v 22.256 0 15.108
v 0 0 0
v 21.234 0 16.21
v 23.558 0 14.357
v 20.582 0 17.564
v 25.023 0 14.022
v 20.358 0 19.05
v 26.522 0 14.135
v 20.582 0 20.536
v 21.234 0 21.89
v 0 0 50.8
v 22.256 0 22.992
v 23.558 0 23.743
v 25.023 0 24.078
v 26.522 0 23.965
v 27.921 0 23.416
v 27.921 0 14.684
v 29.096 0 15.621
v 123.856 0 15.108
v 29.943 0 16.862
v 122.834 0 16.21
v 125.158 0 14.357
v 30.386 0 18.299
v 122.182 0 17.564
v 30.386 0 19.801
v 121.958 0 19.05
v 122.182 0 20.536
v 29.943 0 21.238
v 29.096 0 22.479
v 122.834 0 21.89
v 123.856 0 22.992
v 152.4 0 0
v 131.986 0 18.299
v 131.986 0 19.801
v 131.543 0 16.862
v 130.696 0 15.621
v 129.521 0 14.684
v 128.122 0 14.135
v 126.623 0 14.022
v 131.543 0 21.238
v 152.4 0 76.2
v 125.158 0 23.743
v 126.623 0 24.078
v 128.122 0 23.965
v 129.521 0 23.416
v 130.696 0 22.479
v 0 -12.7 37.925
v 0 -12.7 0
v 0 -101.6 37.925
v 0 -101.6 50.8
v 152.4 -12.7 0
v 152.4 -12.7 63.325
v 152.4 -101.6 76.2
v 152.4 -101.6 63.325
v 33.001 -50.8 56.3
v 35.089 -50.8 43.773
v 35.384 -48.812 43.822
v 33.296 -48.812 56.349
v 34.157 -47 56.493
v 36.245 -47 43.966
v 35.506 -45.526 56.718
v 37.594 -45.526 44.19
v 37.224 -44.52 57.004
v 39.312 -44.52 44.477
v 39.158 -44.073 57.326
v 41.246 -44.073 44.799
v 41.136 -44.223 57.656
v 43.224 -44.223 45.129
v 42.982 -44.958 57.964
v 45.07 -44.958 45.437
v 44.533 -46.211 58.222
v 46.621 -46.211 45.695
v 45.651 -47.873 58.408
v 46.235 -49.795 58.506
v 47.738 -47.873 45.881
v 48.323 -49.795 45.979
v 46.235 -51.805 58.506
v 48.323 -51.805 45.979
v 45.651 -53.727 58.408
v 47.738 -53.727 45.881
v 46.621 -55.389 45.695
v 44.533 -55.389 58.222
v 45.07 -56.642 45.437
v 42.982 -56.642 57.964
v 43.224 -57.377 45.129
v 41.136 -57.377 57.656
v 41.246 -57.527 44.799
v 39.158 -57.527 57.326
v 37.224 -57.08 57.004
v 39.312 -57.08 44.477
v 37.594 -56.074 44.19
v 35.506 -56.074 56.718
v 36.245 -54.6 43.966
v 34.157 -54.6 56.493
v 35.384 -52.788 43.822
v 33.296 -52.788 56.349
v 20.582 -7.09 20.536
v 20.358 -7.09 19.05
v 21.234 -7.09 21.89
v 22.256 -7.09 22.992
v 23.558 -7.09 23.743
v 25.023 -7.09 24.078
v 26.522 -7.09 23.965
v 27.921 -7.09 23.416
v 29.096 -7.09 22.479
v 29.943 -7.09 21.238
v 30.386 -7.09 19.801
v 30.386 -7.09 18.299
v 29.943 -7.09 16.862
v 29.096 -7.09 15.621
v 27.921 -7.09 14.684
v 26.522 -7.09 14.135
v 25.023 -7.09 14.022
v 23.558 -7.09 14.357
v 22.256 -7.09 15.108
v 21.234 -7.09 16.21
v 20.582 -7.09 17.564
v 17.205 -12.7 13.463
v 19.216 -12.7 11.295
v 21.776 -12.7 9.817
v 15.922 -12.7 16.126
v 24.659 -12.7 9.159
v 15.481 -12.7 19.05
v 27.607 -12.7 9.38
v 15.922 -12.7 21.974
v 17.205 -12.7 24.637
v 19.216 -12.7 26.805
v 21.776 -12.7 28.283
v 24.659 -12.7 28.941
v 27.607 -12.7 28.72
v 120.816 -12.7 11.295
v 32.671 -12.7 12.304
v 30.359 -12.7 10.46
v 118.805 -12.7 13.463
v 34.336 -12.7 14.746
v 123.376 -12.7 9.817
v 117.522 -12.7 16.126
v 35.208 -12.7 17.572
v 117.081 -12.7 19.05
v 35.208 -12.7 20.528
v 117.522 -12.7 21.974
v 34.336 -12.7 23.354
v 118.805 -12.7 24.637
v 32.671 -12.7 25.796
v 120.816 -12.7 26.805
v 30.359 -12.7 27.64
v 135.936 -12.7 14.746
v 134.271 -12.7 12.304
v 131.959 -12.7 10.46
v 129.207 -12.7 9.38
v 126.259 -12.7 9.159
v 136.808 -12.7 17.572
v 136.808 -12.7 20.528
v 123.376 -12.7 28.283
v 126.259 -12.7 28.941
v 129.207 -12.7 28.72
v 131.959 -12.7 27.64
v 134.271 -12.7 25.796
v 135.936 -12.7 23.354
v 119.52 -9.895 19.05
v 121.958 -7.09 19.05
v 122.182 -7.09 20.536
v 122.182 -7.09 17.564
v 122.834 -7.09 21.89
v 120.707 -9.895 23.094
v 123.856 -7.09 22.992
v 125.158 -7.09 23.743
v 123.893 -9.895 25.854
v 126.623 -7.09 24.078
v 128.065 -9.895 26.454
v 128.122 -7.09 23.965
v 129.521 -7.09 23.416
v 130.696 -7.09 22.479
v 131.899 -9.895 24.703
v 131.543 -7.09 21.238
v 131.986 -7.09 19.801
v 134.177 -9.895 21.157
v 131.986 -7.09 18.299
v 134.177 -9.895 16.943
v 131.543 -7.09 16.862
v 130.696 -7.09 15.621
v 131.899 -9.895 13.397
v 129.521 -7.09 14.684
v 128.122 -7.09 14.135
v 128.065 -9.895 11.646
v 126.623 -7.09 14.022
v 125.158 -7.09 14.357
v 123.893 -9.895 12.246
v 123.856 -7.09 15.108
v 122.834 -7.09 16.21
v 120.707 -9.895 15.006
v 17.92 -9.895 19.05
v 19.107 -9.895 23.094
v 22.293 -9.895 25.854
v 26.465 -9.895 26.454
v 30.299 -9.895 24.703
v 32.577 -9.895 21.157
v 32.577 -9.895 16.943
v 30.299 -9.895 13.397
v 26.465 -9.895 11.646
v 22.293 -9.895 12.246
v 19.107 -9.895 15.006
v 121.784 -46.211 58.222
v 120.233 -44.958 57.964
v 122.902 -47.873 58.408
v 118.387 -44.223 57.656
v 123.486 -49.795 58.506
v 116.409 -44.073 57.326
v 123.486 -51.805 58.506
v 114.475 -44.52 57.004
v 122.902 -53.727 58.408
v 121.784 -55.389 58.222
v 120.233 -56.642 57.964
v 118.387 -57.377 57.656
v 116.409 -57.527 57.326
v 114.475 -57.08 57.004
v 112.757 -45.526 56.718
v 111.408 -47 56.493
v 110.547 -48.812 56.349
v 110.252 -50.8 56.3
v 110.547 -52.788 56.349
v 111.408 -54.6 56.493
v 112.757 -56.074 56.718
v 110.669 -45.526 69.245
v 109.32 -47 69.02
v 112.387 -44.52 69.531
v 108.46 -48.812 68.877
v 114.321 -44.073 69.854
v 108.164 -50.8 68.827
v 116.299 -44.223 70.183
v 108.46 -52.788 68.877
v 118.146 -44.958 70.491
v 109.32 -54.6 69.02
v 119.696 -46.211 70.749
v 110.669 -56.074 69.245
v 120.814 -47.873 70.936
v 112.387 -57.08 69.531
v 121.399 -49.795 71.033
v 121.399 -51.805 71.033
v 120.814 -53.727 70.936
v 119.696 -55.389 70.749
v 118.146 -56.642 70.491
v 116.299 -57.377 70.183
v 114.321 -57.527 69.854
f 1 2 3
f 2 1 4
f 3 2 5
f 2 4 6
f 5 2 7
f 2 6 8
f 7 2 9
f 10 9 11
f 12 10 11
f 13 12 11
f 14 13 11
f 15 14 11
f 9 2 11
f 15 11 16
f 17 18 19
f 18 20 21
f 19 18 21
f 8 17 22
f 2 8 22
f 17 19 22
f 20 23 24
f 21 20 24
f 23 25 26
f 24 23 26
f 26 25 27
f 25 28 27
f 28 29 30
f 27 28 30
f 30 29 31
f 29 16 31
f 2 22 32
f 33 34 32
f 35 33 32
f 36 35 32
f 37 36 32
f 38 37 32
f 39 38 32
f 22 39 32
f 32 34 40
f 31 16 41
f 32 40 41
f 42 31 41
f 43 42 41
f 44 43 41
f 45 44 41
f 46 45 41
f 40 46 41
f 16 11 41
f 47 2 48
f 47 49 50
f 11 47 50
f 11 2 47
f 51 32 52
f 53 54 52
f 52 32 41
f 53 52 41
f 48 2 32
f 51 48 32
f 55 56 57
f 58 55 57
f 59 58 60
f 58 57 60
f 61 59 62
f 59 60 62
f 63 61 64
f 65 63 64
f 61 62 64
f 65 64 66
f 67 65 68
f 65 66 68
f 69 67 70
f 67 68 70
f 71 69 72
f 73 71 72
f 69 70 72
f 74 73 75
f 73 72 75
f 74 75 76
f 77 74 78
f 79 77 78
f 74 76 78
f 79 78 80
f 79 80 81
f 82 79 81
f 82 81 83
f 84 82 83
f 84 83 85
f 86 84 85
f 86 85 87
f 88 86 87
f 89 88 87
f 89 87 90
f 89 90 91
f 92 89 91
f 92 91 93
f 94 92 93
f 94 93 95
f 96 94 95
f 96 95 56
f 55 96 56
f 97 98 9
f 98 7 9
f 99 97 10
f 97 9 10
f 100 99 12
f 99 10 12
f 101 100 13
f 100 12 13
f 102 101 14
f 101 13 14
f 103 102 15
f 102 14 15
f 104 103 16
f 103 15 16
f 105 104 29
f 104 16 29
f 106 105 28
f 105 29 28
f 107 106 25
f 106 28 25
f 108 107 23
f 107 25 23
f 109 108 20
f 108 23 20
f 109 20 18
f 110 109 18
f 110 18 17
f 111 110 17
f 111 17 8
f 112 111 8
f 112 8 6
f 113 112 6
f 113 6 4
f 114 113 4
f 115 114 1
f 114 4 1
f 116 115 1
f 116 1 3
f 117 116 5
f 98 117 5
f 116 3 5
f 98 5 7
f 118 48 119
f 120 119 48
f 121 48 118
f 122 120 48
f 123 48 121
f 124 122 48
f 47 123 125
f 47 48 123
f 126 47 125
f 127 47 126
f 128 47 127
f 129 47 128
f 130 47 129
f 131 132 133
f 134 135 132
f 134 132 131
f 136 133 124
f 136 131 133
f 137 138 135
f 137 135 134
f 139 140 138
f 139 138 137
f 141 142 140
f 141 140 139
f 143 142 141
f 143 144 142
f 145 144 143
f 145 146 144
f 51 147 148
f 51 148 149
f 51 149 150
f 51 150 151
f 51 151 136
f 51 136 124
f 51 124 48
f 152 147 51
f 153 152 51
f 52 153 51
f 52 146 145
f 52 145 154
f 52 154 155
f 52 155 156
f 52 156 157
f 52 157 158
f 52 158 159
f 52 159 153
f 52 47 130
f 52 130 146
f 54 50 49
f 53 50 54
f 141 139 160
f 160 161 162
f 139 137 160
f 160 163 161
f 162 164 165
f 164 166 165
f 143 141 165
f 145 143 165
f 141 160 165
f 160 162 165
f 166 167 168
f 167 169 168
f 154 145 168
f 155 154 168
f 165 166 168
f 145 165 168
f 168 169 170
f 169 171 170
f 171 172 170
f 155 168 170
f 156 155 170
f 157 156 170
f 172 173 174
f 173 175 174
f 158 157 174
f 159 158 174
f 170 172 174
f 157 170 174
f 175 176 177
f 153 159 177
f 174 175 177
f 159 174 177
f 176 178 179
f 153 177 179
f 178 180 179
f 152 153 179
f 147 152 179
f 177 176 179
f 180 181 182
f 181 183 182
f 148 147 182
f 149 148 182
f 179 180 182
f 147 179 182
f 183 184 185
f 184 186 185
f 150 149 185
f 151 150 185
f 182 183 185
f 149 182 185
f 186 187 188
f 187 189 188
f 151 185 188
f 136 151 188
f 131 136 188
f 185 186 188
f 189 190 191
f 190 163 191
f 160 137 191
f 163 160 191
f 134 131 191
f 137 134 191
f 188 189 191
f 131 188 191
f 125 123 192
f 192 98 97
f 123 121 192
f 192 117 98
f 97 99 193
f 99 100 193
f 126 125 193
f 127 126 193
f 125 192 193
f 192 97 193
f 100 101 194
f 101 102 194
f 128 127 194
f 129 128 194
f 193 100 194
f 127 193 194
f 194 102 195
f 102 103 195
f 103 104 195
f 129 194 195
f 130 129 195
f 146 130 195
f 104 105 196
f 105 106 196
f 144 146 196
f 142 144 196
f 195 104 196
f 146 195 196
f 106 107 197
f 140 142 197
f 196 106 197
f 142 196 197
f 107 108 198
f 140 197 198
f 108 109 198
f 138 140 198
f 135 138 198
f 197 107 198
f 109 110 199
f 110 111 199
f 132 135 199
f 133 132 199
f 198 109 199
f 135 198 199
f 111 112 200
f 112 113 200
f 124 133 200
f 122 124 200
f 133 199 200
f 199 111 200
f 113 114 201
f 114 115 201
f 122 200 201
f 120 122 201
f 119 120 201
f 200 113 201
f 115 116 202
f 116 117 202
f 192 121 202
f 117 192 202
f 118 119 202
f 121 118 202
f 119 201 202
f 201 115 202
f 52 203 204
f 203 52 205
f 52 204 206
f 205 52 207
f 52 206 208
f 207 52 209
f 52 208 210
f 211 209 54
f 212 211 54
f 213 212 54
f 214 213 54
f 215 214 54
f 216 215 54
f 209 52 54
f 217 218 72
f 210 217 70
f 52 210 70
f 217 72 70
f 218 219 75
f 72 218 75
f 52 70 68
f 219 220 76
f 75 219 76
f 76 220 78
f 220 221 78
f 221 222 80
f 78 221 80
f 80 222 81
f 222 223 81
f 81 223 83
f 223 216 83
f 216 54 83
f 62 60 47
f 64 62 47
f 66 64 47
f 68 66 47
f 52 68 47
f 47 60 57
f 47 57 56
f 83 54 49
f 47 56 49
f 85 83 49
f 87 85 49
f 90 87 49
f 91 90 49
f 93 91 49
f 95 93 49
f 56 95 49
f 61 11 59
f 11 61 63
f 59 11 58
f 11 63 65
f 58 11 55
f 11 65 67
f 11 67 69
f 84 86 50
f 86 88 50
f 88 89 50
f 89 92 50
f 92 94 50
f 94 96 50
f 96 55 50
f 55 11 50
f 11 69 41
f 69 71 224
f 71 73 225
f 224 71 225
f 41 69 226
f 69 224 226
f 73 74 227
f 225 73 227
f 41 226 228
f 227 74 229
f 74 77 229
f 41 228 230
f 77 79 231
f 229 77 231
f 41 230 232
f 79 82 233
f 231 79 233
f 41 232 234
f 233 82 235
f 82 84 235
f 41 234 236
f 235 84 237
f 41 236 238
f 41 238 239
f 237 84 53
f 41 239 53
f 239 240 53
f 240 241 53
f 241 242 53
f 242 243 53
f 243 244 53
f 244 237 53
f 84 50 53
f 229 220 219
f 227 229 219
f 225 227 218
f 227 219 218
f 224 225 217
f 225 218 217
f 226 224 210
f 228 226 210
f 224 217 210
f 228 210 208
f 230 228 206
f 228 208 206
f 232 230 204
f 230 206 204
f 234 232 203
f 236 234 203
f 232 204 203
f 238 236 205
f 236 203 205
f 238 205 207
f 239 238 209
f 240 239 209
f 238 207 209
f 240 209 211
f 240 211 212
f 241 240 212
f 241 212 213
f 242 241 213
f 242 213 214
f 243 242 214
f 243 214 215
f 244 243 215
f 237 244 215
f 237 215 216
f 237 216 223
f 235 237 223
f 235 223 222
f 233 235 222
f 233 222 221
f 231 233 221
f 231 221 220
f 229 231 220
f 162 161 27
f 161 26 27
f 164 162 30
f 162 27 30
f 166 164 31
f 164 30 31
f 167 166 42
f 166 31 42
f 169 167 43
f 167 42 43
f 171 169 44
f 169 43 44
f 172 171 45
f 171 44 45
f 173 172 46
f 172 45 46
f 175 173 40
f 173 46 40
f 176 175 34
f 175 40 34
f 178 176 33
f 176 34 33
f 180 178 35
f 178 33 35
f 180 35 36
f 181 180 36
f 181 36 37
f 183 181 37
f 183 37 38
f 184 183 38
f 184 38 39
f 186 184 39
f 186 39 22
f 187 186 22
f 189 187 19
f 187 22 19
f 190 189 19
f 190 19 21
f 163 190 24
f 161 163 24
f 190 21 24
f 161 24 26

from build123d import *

# Parameters (mm, degrees)
F0_W           = 152.4
F0_H           = 101.6
F1_DEPTH       = 101.6
F3_DEPTH       = 101.601
F5_DEPTH       = 88.9
F7_D           = 10.0838
F7_CSINK_D     = 19.8374
F7_CSINK_ANGLE = 82
F9_D           = 13.49248


with BuildPart() as f1:
    # F0 (on Front) → F1 (new body)
    with BuildSketch(Plane.XZ):
        with Locations((76.2, 50.8)):
            Rectangle(F0_W, F0_H)
    extrude(amount=F1_DEPTH)

    # F2 (on face) → F3 (cut, through all)
    with BuildSketch(Plane.XZ.offset(101.6)):
        Polygon((0, 50.8), (152.4, 76.2), (152.4, 101.6), (0, 101.6), align=None)
    extrude(amount=-F3_DEPTH, mode=Mode.SUBTRACT)

    # F4 (on face) → F5 (cut)
    with BuildSketch(Plane.XZ.offset(101.6)):
        Polygon((0, 37.9248193109), (0, 0), (152.4, 0), (152.4, 63.3248193109), align=None)
    extrude(amount=-F5_DEPTH, mode=Mode.SUBTRACT)

    # F7 (through all)
    with Locations(Plane.XZ.offset(12.7)):
        with Locations((25.4, 19.05), (127, 19.05)):
            CounterSinkHole(F7_D / 2, F7_CSINK_D / 2, counter_sink_angle=F7_CSINK_ANGLE)

    # F9 (through all)
    with Locations(Plane(origin=(-8.2378378378, 0, 49.427027027), x_dir=(0.9863939238, 0, 0.1643989873), z_dir=(-0.1643989873, 0, 0.9863939238))):
        with Locations((124.7536368247, -50.8), (48.5536368247, -50.8)):
            Hole(F9_D / 2)


solid = f1.part
